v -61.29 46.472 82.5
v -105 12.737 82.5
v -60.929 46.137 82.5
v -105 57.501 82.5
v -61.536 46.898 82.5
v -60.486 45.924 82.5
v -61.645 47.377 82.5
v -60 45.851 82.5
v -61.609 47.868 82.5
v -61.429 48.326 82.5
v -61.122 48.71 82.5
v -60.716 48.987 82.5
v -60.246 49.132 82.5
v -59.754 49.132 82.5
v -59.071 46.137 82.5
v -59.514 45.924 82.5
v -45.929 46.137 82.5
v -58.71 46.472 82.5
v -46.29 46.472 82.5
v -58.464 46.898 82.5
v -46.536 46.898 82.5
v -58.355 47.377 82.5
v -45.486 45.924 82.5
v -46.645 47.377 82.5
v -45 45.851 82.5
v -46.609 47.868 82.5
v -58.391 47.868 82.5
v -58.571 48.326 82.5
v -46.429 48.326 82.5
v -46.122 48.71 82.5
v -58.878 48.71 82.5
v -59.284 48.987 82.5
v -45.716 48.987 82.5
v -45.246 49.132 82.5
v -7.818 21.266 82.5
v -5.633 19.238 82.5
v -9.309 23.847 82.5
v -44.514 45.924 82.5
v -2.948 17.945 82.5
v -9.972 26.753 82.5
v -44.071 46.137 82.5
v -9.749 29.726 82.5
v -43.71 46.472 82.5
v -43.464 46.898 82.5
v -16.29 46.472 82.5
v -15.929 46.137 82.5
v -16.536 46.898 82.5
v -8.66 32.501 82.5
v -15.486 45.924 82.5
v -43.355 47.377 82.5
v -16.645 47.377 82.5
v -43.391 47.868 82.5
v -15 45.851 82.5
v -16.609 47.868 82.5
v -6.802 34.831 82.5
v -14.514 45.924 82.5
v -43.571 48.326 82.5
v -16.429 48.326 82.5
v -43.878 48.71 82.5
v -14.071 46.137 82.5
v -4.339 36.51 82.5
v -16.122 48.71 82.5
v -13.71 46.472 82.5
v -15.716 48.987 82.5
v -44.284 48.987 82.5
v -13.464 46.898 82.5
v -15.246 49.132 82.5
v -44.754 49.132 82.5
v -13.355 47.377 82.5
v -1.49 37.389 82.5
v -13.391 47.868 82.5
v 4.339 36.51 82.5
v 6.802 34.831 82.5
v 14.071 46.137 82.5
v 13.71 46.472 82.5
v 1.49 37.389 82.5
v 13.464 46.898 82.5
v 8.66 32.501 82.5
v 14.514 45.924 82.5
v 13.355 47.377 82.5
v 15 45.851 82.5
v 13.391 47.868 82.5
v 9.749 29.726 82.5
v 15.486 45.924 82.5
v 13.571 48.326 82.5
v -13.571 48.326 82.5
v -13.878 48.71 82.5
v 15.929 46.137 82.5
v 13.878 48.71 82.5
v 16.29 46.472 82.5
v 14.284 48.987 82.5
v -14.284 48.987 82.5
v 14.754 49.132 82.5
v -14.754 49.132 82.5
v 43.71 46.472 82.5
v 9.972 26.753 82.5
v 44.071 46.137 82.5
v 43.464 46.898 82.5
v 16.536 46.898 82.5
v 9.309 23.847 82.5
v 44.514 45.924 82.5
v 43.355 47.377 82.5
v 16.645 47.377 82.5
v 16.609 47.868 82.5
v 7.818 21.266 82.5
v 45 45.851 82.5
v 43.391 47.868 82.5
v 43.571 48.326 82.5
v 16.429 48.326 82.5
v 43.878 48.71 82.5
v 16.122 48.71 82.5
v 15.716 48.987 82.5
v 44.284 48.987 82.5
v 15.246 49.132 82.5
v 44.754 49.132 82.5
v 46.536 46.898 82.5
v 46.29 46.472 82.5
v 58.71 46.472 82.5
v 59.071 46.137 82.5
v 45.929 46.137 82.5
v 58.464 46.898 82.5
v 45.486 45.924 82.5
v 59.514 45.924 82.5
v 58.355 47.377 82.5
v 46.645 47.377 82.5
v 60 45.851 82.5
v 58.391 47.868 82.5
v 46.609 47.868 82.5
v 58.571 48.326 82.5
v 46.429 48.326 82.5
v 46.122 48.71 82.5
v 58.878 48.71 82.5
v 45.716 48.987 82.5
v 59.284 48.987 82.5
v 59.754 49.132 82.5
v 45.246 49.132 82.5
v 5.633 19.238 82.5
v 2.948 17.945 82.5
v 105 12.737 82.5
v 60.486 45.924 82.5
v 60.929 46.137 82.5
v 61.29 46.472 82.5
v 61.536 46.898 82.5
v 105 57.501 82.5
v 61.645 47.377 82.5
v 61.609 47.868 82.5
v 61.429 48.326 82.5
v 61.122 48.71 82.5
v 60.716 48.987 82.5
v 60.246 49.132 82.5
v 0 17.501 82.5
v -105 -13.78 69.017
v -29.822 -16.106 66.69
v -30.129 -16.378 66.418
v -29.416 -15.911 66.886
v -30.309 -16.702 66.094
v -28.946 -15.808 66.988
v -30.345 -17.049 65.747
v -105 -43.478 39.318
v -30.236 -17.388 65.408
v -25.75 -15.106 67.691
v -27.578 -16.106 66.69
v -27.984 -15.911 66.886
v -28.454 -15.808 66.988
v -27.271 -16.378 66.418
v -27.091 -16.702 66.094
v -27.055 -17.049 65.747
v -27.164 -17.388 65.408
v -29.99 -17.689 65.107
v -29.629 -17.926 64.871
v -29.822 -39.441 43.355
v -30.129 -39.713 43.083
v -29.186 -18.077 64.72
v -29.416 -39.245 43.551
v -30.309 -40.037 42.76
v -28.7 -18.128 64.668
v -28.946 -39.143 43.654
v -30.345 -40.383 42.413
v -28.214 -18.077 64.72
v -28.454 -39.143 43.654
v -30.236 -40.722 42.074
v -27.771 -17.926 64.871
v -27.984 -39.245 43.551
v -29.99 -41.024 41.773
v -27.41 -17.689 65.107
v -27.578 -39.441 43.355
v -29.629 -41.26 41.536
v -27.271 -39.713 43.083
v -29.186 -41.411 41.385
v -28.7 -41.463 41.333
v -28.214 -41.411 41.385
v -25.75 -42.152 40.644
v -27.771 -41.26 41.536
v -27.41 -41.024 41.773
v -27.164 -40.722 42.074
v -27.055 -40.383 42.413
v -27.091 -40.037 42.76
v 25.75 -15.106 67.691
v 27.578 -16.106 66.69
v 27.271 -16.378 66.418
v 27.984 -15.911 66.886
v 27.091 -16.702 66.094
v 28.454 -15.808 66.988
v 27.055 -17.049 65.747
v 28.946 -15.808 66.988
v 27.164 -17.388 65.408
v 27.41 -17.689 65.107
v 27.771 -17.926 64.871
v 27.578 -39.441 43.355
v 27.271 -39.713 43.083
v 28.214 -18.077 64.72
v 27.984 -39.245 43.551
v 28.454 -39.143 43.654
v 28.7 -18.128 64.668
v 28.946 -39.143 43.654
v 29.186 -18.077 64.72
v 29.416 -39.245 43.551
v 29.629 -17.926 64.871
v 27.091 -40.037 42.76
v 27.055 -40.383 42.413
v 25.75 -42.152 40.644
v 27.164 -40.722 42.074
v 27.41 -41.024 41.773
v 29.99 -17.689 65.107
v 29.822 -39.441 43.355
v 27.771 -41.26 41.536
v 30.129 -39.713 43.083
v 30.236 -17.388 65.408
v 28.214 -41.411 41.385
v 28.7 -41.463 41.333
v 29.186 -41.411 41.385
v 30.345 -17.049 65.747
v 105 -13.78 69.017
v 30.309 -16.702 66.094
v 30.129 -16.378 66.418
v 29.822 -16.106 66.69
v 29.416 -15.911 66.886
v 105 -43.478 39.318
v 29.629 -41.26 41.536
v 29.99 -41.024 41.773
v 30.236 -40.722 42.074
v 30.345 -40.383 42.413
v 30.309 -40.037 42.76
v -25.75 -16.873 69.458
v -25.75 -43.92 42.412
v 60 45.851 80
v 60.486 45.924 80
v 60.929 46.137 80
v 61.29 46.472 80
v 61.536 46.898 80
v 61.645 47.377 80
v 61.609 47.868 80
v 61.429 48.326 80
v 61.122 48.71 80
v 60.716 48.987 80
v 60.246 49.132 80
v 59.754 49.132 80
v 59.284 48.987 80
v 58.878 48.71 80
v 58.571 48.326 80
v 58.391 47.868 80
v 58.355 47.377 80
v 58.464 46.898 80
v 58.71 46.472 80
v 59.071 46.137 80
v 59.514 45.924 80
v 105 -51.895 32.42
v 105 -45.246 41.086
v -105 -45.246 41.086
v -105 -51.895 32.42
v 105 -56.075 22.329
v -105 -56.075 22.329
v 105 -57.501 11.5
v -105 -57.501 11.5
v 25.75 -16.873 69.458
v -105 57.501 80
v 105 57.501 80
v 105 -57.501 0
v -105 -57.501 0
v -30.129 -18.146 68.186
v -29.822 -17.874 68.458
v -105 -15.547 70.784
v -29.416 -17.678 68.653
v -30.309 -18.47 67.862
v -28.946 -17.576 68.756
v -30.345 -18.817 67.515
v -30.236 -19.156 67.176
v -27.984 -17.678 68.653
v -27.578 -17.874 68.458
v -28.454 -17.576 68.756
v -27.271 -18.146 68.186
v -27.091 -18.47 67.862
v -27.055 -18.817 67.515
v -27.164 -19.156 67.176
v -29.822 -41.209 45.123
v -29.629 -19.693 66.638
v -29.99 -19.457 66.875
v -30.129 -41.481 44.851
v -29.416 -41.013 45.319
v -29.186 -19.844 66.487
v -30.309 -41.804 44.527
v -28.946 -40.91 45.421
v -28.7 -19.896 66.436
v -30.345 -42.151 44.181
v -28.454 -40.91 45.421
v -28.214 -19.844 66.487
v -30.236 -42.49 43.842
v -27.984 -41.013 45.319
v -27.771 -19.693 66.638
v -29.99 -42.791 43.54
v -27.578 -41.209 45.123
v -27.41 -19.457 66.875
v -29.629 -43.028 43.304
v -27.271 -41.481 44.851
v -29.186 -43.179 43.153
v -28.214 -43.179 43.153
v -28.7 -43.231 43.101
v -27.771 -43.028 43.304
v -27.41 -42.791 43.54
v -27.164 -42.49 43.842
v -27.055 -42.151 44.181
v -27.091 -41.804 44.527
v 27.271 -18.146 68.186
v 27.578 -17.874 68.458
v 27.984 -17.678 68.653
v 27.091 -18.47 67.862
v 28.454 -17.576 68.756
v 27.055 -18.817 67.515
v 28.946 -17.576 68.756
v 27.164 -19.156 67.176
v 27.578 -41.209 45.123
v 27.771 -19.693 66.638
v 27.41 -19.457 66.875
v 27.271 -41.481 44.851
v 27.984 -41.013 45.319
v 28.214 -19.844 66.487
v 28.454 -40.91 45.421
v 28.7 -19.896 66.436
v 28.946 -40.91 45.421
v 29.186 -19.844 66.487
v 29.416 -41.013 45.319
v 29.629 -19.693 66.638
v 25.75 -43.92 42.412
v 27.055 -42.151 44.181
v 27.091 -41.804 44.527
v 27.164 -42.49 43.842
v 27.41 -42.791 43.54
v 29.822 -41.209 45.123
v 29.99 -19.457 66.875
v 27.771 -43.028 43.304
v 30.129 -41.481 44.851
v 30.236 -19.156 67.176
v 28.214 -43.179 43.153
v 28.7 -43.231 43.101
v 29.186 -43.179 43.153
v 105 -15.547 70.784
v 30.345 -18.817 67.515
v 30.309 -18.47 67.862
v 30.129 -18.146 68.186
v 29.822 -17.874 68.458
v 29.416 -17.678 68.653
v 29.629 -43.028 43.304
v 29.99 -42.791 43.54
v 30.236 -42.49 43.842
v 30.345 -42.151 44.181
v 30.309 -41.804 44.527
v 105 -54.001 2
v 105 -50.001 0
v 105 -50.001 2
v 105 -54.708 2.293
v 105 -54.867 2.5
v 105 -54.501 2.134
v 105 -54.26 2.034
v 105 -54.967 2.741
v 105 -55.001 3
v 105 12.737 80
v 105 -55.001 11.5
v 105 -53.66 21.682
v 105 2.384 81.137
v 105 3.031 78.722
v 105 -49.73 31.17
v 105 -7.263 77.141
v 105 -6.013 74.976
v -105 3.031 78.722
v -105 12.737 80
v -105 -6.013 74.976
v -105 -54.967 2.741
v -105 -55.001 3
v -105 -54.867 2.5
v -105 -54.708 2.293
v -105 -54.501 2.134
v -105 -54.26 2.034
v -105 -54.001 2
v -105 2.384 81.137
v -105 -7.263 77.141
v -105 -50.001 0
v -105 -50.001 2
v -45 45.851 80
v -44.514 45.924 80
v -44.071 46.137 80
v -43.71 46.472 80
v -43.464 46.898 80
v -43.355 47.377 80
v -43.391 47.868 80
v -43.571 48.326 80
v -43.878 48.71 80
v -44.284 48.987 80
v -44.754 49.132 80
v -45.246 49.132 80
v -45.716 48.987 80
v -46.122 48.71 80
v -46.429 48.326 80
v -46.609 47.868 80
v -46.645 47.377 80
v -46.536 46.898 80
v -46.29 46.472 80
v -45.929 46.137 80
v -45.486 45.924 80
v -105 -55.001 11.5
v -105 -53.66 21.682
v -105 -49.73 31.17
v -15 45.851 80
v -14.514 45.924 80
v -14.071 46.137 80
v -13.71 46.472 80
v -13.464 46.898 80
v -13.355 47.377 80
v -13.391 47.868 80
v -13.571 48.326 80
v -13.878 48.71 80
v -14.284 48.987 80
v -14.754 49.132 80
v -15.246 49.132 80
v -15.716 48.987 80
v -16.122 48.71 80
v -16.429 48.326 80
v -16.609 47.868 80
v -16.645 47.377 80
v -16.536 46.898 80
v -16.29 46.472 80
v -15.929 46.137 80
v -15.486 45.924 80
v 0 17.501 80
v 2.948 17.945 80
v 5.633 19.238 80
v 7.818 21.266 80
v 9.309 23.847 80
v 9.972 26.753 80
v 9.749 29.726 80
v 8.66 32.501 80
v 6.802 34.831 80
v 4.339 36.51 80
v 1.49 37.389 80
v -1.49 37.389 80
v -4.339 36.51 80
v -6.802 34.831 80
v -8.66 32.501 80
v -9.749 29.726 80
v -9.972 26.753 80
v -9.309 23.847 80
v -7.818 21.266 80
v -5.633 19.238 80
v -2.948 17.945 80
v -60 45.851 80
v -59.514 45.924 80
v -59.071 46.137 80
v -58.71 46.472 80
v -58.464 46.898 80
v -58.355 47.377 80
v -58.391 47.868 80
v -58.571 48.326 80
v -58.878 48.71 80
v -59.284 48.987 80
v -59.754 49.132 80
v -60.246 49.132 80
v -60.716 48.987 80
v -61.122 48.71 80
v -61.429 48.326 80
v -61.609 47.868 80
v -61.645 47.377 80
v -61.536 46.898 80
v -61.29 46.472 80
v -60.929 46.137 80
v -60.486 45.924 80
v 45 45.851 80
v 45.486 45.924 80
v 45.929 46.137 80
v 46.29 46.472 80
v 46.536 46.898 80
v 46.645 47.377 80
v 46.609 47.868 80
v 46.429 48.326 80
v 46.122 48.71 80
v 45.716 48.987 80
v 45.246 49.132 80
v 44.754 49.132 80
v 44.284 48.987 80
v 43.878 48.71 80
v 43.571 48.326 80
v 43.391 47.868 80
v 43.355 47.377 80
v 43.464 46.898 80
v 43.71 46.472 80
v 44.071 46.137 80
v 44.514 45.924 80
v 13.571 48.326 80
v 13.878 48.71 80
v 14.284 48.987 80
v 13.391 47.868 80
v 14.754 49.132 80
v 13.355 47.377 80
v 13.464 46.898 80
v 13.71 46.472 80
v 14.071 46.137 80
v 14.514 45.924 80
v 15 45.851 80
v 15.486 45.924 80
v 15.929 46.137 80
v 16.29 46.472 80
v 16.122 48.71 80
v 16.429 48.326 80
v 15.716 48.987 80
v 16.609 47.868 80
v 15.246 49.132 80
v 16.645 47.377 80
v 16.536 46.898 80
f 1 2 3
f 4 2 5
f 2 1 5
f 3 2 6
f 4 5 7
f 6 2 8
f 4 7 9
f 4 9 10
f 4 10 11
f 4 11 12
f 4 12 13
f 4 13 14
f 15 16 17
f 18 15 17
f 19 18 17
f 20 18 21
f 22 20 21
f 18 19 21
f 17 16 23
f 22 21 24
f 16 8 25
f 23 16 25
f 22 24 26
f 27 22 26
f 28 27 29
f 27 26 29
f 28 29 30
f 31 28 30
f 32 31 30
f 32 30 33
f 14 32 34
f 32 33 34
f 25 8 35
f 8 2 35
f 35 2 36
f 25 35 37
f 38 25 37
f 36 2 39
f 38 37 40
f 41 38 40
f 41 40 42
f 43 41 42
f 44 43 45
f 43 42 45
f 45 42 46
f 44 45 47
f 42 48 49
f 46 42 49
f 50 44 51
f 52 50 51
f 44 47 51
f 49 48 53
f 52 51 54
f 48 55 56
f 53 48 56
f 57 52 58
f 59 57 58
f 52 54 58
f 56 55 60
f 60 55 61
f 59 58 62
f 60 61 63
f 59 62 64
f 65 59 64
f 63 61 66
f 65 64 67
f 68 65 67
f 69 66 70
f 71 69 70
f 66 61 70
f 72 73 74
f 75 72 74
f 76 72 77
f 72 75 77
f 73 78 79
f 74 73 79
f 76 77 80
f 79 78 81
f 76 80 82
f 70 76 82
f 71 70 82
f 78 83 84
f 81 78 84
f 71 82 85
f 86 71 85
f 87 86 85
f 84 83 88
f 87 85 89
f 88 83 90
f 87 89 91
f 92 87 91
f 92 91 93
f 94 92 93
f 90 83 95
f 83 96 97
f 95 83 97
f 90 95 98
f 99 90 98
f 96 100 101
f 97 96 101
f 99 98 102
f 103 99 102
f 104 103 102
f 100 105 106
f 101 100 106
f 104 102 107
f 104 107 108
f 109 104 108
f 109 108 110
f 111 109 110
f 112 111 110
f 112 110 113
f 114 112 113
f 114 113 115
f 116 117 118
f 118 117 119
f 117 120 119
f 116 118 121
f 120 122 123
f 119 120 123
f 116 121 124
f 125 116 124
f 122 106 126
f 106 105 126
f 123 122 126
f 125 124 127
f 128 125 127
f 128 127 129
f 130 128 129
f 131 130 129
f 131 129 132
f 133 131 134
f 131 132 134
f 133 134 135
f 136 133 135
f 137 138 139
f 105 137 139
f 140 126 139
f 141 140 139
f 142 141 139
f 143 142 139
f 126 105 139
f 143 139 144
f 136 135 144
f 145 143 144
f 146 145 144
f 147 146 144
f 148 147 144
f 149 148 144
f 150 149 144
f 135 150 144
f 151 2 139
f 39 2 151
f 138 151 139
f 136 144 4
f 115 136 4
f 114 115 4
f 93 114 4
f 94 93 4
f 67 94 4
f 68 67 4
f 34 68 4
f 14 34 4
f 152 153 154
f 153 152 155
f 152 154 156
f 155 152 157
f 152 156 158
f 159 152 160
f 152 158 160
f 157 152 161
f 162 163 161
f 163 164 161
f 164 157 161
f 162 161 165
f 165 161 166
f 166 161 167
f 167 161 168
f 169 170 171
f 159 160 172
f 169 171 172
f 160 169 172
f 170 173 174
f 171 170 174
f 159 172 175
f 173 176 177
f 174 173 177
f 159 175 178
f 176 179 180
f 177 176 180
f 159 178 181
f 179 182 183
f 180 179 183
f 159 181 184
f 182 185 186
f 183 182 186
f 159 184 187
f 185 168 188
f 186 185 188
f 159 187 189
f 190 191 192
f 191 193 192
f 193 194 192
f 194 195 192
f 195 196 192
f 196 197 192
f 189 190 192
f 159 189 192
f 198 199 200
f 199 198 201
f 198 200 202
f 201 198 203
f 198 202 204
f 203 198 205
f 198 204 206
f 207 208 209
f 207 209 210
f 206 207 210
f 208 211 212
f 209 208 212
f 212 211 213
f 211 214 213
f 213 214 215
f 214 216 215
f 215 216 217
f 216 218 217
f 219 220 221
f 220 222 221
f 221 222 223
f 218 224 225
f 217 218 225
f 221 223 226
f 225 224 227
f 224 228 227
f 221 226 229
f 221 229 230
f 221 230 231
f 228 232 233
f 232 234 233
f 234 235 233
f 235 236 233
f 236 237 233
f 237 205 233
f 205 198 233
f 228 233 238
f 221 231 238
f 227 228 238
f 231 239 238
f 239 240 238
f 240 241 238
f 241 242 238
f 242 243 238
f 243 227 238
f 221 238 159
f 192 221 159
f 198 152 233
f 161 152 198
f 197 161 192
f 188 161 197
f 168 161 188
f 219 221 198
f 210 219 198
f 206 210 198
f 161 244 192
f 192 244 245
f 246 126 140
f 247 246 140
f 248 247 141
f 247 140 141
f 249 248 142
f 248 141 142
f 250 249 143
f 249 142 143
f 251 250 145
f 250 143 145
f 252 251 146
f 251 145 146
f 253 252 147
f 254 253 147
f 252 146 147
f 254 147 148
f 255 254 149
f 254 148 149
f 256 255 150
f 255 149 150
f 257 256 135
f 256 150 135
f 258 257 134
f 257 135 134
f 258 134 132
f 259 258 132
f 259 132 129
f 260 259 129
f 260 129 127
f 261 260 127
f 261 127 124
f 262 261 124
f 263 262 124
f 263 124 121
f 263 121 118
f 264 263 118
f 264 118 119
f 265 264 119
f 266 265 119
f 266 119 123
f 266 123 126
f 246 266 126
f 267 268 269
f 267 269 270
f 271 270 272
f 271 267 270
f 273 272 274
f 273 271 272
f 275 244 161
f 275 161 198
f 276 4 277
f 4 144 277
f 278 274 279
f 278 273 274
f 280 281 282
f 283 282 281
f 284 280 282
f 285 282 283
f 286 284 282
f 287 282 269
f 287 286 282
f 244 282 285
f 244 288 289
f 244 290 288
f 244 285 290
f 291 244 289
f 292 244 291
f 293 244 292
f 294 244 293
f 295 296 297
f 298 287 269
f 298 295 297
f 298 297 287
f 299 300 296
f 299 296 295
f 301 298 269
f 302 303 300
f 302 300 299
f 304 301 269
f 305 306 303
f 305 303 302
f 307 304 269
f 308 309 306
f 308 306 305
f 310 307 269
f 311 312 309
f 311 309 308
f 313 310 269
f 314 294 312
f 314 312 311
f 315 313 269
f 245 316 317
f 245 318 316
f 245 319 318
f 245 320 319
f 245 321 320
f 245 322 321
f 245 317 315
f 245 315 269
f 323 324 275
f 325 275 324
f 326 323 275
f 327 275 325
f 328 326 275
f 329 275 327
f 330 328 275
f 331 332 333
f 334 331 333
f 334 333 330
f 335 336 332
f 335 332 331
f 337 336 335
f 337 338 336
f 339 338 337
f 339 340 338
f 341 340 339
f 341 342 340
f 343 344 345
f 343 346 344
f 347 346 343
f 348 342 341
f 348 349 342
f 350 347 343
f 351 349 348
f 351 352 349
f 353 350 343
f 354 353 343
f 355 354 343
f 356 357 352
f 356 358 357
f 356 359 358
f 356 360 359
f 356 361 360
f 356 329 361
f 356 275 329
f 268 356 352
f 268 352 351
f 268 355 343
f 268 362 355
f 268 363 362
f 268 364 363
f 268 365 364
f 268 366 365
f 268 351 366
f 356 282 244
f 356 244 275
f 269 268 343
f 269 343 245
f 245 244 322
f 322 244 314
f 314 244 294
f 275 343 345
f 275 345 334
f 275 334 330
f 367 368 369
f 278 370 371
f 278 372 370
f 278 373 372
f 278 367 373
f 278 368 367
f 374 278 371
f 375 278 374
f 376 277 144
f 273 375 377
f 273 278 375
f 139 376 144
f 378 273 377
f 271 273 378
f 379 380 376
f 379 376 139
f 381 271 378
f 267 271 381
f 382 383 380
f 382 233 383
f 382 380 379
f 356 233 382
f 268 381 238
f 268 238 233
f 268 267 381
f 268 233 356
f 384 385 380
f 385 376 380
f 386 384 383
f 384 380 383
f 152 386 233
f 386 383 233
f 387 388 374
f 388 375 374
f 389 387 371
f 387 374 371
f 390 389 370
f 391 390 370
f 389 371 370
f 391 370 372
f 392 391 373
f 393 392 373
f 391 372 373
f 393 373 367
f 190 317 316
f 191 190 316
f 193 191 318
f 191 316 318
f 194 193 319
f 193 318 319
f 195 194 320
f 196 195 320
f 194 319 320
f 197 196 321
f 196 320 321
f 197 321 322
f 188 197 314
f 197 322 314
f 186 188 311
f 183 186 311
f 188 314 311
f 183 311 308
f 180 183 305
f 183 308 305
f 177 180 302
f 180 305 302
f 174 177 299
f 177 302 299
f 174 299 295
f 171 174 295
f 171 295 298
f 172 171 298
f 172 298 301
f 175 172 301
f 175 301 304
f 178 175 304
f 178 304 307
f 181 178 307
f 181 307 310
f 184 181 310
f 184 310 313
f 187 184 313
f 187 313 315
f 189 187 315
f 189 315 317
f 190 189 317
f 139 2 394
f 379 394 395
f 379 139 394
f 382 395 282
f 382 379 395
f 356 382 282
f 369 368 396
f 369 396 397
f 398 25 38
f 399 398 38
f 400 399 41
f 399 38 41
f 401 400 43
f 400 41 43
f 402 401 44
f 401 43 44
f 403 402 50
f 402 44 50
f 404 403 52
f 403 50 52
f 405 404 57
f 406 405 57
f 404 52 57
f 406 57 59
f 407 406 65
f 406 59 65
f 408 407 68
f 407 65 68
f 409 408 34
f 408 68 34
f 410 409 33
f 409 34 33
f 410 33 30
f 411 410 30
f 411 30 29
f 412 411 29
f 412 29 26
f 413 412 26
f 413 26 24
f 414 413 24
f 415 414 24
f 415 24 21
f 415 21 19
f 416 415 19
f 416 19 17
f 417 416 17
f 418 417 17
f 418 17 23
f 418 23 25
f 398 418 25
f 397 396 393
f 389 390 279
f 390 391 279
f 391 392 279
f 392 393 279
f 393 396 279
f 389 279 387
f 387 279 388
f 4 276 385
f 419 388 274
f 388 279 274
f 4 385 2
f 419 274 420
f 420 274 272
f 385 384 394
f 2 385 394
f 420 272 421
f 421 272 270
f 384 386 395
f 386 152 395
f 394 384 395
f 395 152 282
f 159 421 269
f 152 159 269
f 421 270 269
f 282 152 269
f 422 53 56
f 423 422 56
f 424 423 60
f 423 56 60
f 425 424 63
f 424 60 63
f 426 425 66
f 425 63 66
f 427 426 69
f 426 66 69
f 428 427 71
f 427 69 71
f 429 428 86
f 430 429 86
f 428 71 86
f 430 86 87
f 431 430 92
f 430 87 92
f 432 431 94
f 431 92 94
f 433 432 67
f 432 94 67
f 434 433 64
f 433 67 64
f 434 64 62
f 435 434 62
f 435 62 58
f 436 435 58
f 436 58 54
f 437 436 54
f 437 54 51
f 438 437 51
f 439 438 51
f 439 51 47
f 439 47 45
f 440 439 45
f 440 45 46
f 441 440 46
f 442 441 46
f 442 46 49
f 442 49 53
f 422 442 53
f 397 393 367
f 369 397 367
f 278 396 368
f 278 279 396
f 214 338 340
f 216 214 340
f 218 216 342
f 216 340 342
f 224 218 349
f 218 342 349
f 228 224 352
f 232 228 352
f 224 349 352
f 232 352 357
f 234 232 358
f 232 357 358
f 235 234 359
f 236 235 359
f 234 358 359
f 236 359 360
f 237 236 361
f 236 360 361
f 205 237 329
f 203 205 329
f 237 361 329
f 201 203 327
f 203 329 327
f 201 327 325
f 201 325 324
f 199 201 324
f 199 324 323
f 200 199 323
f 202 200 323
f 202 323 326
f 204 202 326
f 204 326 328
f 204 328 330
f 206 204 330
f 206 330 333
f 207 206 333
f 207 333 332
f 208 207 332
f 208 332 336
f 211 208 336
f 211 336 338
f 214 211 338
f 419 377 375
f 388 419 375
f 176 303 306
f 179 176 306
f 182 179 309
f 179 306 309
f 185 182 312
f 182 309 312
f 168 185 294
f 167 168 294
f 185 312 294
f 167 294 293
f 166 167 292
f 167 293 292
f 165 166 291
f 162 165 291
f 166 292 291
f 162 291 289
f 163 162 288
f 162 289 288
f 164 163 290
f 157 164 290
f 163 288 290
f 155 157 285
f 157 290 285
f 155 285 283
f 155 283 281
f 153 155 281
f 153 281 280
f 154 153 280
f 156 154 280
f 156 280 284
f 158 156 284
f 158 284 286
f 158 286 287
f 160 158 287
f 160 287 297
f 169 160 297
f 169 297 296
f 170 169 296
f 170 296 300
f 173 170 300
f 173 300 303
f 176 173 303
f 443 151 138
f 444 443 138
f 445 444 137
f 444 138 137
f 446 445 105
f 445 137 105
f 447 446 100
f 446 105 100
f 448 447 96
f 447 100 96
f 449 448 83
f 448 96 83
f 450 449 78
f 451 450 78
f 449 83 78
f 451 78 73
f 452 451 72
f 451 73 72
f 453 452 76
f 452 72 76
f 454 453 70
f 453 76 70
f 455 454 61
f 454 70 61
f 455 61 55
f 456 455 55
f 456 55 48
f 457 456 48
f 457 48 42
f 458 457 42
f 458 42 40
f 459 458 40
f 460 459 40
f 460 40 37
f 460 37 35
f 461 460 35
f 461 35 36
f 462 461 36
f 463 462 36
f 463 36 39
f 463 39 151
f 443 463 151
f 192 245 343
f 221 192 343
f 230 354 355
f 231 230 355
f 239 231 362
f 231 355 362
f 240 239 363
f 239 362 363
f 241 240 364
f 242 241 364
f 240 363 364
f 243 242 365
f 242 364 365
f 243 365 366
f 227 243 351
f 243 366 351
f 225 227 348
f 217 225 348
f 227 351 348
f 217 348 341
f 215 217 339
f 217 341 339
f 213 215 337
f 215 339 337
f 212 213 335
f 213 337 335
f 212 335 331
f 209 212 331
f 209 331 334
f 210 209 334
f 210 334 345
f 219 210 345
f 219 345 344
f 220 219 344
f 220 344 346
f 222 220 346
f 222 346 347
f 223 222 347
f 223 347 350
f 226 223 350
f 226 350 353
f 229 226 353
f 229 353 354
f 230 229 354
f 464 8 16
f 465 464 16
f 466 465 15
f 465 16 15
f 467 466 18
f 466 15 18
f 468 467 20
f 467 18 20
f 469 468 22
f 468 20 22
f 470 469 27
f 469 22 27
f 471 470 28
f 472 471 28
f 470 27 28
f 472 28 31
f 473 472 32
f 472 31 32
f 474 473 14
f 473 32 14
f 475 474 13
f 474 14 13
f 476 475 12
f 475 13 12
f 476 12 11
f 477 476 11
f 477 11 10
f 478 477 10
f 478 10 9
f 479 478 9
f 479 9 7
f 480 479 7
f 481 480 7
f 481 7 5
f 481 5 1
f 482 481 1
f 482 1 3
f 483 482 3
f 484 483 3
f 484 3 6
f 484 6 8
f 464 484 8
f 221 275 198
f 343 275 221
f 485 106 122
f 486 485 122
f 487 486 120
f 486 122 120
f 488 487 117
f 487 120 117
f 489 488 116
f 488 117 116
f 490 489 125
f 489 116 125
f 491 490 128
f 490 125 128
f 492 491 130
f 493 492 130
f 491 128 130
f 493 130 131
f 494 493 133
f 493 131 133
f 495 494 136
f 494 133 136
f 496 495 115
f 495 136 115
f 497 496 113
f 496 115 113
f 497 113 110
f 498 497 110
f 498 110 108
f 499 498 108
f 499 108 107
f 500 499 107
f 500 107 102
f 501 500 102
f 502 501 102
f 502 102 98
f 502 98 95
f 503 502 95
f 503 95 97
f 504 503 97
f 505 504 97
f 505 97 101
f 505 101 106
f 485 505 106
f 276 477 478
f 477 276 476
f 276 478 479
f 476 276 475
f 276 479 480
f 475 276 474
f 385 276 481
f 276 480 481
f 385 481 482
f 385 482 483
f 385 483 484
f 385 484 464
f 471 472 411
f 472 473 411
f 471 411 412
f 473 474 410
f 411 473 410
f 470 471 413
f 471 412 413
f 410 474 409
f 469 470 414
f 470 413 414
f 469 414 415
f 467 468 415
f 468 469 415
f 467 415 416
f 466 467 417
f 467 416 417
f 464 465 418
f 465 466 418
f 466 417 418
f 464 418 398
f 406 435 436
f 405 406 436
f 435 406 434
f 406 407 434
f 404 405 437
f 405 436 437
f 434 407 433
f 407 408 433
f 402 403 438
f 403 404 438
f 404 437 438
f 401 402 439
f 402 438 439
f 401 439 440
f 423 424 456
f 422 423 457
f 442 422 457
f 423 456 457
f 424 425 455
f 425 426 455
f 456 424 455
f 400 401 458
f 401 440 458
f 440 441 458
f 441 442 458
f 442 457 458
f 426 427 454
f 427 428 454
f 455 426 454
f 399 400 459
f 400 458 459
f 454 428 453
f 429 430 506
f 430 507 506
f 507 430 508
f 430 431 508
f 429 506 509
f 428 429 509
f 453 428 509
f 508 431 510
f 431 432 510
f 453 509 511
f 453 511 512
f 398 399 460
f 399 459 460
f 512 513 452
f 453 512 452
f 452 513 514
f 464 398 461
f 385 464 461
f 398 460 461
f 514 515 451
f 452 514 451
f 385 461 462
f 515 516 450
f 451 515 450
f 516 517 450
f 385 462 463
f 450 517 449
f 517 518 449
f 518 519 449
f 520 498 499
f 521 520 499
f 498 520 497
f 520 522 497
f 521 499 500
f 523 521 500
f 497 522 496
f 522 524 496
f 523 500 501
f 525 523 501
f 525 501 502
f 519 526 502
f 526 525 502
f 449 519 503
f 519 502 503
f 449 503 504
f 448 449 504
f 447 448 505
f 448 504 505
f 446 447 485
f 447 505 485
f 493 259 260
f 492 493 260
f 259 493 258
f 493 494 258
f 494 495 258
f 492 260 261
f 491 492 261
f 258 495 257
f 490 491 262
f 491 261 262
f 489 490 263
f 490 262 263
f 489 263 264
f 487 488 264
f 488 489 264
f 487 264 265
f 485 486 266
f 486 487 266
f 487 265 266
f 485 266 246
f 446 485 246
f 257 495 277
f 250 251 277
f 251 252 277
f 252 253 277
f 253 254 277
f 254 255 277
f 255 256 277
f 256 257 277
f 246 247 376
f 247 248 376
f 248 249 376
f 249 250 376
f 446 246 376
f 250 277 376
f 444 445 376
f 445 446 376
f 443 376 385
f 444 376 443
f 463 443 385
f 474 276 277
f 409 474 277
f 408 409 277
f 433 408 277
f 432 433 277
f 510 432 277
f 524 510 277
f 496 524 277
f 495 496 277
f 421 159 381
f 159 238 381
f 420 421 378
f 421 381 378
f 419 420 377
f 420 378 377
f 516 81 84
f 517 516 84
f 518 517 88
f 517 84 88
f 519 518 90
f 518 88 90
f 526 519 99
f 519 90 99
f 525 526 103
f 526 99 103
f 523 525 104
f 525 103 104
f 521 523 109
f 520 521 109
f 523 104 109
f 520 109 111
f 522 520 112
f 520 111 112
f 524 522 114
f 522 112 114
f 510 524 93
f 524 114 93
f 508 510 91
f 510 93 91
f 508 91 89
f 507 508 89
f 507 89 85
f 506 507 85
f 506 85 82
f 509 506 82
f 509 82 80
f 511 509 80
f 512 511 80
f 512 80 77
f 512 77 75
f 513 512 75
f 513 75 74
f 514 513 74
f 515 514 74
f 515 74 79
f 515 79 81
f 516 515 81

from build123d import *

# Parameters (mm, degrees)
PAD_DEPTH       = 105
PAD_DEPTH_BACK  = 105
SKETCH001_R     = 1.65
SKETCH001_W     = 38.25
SKETCH001_H     = 51.5
POCKET_DEPTH    = 101.705966
SKETCH003_R     = 1.65
POCKET001_DEPTH = 5
SKETCH004_W     = 2
SKETCH004_H     = 210
PAD001_DEPTH    = 5
FILLET_R        = 1
SKETCH005_R     = 10
POCKET002_DEPTH = 5


with BuildPart() as part:
    # Sketch → Pad (new body, two sides)
    with BuildSketch(Plane.YZ) as pad_sk:
        with BuildLine():
            Line((12.736792, 82.5), (57.500792, 82.5))
            Line((57.500792, 82.5), (57.500792, 80))
            Line((57.500792, 80), (12.736792, 80))
            ThreePointArc((12.736792, 80), (-1.613837, 77.145482), (-13.779712, 69.016504))
            Line((-13.779712, 69.016504), (-43.478197, 39.318019))
            ThreePointArc((-43.478197, 39.318019), (-52.006167, 26.55501), (-55.000792, 11.500014))
            Line((-55.000792, 11.500014), (-55.000792, 0))
            Line((-55.000792, 0), (-57.500792, 0))
            Line((-57.500792, 11.500014), (-57.500792, 0))
            ThreePointArc((-45.245964, 41.085786), (-54.315866, 27.511719), (-57.500792, 11.500014))
            Line((-15.547479, 70.784271), (-45.245964, 41.085786))
            ThreePointArc((12.736792, 82.5), (-2.570545, 79.455181), (-15.547479, 70.784271))
        make_face()
    extrude(amount=PAD_DEPTH)
    extrude(pad_sk.sketch, amount=-PAD_DEPTH_BACK)

    # Sketch001 (on Face12 of Pad) → Pocket (cut, through all)
    with BuildSketch(Plane(origin=(0, -43.165875, 43.165875), x_dir=(0, -0.707107, -0.707107), z_dir=(0, -0.707107, 0.707107))):
        with Locations((-34.55831, 28.7)):
            Circle(SKETCH001_R)
        with Locations((-1.55831, 28.7)):
            Circle(SKETCH001_R)
        with Locations((-34.55831, -28.7)):
            Circle(SKETCH001_R)
        with Locations((-1.55831, -28.7)):
            Circle(SKETCH001_R)
        with Locations((-18.05831, 0)):
            Rectangle(SKETCH001_W, SKETCH001_H)
    extrude(amount=-POCKET_DEPTH, mode=Mode.SUBTRACT)

    # Sketch003 (on Face2 of Pocket) → Pocket001 (cut)
    with BuildSketch(Plane(origin=(0, 0, 82.5), x_dir=(0, -1, 0), z_dir=(0, 0, 1))):
        with Locations((-47.500792, 15)):
            Circle(SKETCH003_R)
        with Locations((-47.500792, 45)):
            Circle(SKETCH003_R)
        with Locations((-47.500792, -15)):
            Circle(SKETCH003_R)
        with Locations((-47.500792, -45)):
            Circle(SKETCH003_R)
        with Locations((-47.500792, 60)):
            Circle(SKETCH003_R)
        with Locations((-47.500792, -60)):
            Circle(SKETCH003_R)
    extrude(amount=-POCKET001_DEPTH, mode=Mode.SUBTRACT)

    # Sketch004 (on Face26 of Pocket001) → Pad001 (join)
    with BuildSketch(Plane.ZX.offset(-55.000792)):
        with Locations((1, 0)):
            Rectangle(SKETCH004_W, SKETCH004_H)
    extrude(amount=PAD001_DEPTH)

    # Fillet
    fillet_edges = [part.edges().sort_by_distance(p)[0] for p in [
        (0, -55.000792, 2),
    ]]
    fillet(fillet_edges, radius=FILLET_R)

    # Sketch005 (on Face15 of Fillet) → Pocket002 (cut)
    with BuildSketch(Plane(origin=(0, 0, 82.5), x_dir=(0, -1, 0), z_dir=(0, 0, 1))):
        with Locations((-27.500792, 0)):
            Circle(SKETCH005_R)
    extrude(amount=-POCKET002_DEPTH, mode=Mode.SUBTRACT)


solid = part.part
